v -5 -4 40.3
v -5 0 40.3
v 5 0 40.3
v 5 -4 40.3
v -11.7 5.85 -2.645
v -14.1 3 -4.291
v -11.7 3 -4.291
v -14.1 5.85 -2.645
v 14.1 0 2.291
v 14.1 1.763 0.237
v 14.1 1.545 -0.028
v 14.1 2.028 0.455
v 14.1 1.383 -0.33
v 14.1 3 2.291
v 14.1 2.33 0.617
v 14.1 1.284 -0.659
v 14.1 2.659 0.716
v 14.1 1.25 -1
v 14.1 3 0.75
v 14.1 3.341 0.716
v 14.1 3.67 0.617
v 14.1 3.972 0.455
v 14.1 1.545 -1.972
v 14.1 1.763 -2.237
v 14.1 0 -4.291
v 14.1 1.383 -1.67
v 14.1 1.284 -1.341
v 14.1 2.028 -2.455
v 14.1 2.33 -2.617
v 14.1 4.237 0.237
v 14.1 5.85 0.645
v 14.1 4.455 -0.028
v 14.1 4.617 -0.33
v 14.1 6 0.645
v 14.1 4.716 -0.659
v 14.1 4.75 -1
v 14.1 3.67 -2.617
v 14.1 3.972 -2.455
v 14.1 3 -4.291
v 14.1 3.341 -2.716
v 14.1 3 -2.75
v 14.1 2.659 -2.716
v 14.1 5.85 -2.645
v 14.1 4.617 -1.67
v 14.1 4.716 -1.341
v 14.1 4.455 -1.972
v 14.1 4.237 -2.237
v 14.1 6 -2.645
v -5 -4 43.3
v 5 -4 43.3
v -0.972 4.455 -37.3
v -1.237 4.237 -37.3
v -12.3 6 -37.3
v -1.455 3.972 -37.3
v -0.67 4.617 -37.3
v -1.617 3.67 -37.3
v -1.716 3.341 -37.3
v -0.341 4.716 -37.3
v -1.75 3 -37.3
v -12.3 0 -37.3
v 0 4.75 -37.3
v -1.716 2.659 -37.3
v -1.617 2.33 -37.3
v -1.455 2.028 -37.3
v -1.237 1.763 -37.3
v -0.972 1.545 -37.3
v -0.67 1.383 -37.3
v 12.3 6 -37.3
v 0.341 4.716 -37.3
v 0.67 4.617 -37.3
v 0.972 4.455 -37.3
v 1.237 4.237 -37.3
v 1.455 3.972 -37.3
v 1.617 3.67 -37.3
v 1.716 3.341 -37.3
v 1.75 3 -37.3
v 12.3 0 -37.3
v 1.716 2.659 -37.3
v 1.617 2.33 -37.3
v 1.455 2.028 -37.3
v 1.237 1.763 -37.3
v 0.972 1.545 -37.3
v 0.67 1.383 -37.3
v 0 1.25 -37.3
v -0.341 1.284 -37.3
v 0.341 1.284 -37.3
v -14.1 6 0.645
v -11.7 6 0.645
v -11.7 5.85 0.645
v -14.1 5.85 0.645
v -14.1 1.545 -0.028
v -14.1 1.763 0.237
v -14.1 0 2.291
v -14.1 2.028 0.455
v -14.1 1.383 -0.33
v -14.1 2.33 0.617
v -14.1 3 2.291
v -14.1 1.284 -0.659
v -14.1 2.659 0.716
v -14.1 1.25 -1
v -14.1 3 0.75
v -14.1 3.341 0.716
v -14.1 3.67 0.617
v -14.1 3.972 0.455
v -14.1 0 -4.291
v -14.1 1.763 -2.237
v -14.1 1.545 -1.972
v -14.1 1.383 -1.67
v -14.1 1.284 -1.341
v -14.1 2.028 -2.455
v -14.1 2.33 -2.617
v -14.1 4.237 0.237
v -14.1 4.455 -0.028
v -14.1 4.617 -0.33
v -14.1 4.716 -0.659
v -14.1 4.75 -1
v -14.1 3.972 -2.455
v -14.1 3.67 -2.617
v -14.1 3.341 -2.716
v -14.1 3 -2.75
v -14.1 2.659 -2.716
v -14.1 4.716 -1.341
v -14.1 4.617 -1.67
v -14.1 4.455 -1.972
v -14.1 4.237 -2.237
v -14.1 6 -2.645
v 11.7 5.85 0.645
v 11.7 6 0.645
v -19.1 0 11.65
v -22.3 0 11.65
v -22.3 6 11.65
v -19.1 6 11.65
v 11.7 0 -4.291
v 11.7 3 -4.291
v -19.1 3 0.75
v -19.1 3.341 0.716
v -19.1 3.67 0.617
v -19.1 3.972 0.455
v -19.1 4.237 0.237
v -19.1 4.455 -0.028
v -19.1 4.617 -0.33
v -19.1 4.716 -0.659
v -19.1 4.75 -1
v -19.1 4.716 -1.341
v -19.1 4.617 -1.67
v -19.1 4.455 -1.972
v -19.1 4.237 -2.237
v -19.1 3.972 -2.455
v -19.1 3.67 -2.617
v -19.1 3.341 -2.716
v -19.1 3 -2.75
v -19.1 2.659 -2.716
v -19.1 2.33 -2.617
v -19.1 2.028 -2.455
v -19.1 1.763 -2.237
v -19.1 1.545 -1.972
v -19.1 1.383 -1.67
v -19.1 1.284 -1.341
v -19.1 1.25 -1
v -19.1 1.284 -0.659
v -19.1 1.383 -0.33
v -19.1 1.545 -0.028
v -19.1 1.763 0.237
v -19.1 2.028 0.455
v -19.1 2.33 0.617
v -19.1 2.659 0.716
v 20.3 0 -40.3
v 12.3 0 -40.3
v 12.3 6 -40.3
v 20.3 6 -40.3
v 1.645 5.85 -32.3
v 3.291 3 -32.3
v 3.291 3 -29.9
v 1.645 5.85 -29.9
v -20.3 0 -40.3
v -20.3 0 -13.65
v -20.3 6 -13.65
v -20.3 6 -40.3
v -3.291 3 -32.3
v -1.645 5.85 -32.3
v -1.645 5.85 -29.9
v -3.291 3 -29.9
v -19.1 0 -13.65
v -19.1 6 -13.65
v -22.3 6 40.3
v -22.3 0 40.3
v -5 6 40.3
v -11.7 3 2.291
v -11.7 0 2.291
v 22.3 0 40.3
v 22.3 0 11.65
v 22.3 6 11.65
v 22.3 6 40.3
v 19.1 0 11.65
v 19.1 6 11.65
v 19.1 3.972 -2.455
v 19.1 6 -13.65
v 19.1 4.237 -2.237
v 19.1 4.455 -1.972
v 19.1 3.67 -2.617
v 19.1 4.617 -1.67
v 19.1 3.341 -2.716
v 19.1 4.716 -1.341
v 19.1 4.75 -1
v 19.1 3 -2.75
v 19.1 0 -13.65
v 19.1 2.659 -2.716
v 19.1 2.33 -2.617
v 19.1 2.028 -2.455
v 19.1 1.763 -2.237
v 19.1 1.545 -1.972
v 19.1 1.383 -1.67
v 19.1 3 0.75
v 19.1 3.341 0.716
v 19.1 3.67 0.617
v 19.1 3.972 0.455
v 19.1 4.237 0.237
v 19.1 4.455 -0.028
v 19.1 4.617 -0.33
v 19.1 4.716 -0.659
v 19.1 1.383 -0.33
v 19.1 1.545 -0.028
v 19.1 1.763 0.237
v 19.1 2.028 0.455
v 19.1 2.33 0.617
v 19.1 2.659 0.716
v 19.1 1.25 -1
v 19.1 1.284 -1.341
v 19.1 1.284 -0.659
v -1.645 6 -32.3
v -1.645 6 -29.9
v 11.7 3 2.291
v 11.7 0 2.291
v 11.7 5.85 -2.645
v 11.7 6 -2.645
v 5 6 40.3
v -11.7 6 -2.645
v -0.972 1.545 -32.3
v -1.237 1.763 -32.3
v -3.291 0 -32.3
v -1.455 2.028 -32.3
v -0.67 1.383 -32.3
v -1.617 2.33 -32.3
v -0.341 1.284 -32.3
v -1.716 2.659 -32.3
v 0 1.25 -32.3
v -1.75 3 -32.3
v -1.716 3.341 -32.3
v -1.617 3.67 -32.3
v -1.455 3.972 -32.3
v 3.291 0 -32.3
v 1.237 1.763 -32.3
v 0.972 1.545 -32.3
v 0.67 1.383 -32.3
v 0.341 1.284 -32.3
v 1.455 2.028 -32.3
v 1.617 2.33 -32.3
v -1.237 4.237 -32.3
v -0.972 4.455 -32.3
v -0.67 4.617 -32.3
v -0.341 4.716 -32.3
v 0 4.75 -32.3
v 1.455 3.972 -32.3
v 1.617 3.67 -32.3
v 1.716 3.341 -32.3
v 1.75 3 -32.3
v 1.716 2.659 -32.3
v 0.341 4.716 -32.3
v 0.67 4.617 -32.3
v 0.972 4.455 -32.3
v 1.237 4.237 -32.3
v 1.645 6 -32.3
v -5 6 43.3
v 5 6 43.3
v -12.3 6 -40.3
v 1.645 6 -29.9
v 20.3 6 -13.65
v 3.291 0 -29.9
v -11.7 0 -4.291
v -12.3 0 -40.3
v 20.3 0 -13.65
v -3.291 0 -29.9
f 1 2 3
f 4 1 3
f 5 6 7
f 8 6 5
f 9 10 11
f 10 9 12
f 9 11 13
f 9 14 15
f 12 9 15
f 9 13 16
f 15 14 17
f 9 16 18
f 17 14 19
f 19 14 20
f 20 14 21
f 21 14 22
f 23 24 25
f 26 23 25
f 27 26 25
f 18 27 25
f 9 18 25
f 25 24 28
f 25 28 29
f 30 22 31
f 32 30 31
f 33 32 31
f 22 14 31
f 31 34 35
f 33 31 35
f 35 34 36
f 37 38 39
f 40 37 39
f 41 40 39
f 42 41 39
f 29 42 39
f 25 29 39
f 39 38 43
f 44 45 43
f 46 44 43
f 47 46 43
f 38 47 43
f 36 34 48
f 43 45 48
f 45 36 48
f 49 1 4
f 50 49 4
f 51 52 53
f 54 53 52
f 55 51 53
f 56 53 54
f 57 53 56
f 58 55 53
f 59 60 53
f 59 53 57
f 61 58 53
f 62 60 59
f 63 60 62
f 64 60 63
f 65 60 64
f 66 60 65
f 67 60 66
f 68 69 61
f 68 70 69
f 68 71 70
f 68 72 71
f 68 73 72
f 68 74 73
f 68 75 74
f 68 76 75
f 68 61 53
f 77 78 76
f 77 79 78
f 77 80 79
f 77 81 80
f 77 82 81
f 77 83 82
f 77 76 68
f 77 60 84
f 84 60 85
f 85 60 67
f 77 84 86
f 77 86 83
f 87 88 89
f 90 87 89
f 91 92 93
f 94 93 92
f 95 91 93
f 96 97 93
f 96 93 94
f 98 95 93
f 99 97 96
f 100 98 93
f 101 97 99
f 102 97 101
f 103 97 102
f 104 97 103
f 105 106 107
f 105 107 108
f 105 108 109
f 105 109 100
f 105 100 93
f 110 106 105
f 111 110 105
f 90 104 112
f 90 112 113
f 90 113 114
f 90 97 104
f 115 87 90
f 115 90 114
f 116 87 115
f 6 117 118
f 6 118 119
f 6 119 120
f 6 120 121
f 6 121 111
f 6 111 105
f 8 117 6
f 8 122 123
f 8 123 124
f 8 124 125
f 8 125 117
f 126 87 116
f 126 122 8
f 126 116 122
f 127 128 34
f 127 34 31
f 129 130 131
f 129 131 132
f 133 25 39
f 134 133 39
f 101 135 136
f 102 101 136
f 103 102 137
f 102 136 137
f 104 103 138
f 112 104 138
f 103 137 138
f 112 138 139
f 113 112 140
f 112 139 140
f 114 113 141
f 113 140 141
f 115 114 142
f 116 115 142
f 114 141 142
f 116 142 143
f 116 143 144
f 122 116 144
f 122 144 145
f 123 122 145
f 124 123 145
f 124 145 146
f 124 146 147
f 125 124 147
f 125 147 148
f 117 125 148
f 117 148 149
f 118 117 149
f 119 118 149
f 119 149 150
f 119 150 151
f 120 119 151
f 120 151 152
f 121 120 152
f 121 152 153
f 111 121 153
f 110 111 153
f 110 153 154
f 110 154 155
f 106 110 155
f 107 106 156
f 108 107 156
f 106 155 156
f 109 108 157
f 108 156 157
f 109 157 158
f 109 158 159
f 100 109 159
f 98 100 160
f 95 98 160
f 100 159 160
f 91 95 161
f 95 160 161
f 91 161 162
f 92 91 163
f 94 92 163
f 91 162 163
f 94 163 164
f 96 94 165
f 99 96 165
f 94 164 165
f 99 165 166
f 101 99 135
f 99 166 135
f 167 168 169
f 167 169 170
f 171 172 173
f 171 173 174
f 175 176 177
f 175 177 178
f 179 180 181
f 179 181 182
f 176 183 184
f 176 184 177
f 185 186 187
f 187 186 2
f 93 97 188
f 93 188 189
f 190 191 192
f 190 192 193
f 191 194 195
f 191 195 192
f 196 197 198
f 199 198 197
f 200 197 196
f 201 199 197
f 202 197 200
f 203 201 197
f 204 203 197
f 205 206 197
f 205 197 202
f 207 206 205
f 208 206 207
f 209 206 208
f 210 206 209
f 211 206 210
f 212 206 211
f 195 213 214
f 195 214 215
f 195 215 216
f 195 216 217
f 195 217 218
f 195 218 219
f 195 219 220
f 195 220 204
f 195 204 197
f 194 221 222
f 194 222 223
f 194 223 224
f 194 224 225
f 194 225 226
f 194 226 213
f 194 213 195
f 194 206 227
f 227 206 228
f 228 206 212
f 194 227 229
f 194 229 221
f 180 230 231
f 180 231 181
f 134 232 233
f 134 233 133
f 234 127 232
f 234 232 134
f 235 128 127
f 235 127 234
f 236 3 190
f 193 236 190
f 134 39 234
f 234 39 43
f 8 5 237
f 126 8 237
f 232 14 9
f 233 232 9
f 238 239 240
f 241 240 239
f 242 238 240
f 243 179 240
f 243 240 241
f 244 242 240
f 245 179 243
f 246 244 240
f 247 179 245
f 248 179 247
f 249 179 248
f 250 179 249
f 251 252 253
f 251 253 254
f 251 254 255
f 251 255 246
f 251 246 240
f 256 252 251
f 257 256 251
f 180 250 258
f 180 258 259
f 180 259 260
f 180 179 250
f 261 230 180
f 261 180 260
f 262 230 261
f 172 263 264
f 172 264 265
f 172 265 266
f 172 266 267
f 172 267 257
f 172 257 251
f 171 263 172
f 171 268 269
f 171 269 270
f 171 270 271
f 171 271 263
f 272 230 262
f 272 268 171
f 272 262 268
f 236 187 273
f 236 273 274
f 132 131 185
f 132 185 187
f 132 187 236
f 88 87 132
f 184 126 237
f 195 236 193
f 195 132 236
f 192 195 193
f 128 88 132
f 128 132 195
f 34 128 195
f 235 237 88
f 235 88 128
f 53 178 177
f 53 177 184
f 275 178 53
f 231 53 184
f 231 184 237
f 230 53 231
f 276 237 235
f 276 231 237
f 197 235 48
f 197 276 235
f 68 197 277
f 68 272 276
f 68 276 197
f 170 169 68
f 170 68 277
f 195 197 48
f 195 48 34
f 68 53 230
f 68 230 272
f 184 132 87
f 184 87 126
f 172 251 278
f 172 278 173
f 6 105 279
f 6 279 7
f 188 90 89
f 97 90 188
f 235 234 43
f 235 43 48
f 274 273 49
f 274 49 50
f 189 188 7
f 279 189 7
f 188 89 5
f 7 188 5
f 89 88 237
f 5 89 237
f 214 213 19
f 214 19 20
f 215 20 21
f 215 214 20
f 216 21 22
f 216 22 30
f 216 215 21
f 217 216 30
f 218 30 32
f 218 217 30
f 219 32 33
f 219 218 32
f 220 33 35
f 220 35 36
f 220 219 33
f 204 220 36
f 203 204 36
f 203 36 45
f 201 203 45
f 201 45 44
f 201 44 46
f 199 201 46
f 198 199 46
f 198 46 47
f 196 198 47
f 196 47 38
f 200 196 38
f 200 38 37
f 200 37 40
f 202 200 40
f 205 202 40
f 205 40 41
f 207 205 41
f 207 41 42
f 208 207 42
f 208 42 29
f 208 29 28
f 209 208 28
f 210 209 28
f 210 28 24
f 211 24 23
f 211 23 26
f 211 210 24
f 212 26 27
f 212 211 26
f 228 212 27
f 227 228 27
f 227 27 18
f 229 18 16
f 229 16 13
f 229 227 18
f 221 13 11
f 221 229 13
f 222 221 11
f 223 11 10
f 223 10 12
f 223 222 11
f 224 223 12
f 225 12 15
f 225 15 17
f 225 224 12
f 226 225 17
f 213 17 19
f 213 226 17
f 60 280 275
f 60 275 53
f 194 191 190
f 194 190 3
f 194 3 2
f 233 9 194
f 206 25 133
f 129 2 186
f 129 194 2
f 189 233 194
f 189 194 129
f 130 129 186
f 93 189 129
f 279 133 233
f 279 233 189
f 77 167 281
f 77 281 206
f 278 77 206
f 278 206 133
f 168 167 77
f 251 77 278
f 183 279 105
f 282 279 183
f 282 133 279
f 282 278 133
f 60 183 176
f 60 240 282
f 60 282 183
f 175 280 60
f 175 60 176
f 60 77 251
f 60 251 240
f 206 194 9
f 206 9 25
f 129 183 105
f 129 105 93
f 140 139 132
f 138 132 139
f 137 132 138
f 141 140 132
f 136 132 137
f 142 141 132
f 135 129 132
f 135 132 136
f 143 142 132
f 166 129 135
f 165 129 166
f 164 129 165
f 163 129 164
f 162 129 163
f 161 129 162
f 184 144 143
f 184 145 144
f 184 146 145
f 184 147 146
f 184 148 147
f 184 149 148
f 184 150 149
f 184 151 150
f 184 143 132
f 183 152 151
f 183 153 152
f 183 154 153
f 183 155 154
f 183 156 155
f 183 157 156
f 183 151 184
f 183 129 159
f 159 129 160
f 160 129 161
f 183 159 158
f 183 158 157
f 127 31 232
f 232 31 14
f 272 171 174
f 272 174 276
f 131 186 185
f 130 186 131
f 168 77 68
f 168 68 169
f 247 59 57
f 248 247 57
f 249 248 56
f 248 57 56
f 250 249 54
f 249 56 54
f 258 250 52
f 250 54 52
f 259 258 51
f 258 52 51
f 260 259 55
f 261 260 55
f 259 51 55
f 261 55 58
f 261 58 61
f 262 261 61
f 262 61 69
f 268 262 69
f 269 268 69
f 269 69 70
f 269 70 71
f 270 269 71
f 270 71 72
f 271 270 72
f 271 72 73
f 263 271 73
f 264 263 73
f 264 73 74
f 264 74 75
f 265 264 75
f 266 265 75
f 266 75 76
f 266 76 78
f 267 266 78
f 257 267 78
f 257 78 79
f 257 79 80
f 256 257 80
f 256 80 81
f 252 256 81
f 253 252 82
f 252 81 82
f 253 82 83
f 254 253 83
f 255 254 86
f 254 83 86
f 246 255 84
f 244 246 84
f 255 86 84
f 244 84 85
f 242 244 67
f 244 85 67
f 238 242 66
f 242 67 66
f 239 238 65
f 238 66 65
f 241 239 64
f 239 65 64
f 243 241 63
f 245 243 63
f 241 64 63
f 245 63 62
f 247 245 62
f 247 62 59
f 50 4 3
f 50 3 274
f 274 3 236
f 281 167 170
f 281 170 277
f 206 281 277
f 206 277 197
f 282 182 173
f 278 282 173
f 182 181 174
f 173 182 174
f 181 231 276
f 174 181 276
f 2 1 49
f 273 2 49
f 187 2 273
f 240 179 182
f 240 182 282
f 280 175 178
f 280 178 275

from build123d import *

# Parameters (mm, degrees)
SALIENTE_EXTRUIR1_DEPTH = 6
CROQUIS2_W              = 10
CROQUIS2_H              = 10
SALIENTE_EXTRUIR2_DEPTH = 3
CORTAR_EXTRUIR1_DEPTH   = 2.4
CORTAR_EXTRUIR2_REACH   = 85.843
CROQUIS4_R              = 1.75
CORTAR_EXTRUIR4_DEPTH   = 2.4
CORTAR_EXTRUIR5_REACH   = 62.207
CROQUIS7_R              = 1.75


with BuildPart() as part:
    # Croquis1 → Saliente-Extruir1 (new body)
    with BuildSketch(Plane(origin=(0, 0, 0), x_dir=(1, 0, 0), z_dir=(0, 1, 0))):
        Polygon((-12.3, 40.3), (-12.3, 37.3), (12.3, 37.3), (12.3, 40.3), (20.3, 40.3), (20.3, 13.65), (19.1, 13.65), (19.1, -11.65), (22.3, -11.65), (22.3, -40.3), (20.3, -40.3), (-20.3, -40.3), (-22.3, -40.3), (-22.3, -11.65), (-19.1, -11.65), (-19.1, 13.65), (-20.3, 13.65), (-20.3, 40.3), align=None)
    extrude(amount=SALIENTE_EXTRUIR1_DEPTH)

    # Croquis2 → Saliente-Extruir2 (add)
    with BuildSketch(Plane.XY.offset(40.3)):
        with Locations((0, 1)):
            Rectangle(CROQUIS2_W, CROQUIS2_H)
    extrude(amount=SALIENTE_EXTRUIR2_DEPTH)

    # Croquis3 → Cortar-Extruir1 (cut)
    with BuildSketch(Plane(origin=(0, 0, -32.3), x_dir=(-1, 0, 0), z_dir=(0, 0, -1))):
        Polygon((1.645448267, 5.85), (3.290896534, 3), (3.290896534, 0), (-3.290896534, 0), (-3.290896534, 3), (-1.645448267, 5.85), (-1.645448267, 6), (1.645448267, 6), align=None)
    extrude(amount=-CORTAR_EXTRUIR1_DEPTH, mode=Mode.SUBTRACT)

    # Croquis4 → Cortar-Extruir2 (cut, up to next)
    with BuildSketch(Plane(origin=(0, 0, -37.3), x_dir=(-1, 0, 0), z_dir=(0, 0, -1)), mode=Mode.PRIVATE) as cortar_extruir2_sk1:
        with Locations((0, 3)):
            Circle(CROQUIS4_R)
    cortar_extruir2_tool1 = extrude(cortar_extruir2_sk1.sketch, amount=-CORTAR_EXTRUIR2_REACH, mode=Mode.PRIVATE) & part.part
    add(cortar_extruir2_tool1.solids().sort_by_distance((0, 3, -37.3))[0], mode=Mode.SUBTRACT)

    # Croquis6 → Cortar-Extruir4 (cut)
    with BuildSketch(Plane.ZY.offset(14.1)):
        Polygon((0.645448267, 5.85), (2.290896534, 3), (2.290896534, 0), (-4.290896534, 0), (-4.290896534, 3), (-2.645448267, 5.85), (-2.645448267, 6), (0.645448267, 6), align=None)
    cortar_extruir4 = extrude(amount=-CORTAR_EXTRUIR4_DEPTH, mode=Mode.SUBTRACT)

    # Croquis7 → Cortar-Extruir5 (cut, up to next)
    with BuildSketch(Plane.ZY.offset(19.1), mode=Mode.PRIVATE) as cortar_extruir5_sk1:
        with Locations((-1, 3)):
            Circle(CROQUIS7_R)
    cortar_extruir5_tool1 = extrude(cortar_extruir5_sk1.sketch, amount=-CORTAR_EXTRUIR5_REACH, mode=Mode.PRIVATE) & part.part
    cortar_extruir5 = cortar_extruir5_tool1.solids().sort_by_distance((-19.1, 3, -1))[0]
    add(cortar_extruir5, mode=Mode.SUBTRACT)

    # Simetría1: Cortar-Extruir4, Cortar-Extruir5 across plane
    add(cortar_extruir4.mirror(Plane(origin=(0, 0, 0), x_dir=(0, 0, 1), z_dir=(1, 0, 0))), mode=Mode.SUBTRACT)
    add(cortar_extruir5.mirror(Plane(origin=(0, 0, 0), x_dir=(0, 0, 1), z_dir=(1, 0, 0))), mode=Mode.SUBTRACT)


solid = part.part
